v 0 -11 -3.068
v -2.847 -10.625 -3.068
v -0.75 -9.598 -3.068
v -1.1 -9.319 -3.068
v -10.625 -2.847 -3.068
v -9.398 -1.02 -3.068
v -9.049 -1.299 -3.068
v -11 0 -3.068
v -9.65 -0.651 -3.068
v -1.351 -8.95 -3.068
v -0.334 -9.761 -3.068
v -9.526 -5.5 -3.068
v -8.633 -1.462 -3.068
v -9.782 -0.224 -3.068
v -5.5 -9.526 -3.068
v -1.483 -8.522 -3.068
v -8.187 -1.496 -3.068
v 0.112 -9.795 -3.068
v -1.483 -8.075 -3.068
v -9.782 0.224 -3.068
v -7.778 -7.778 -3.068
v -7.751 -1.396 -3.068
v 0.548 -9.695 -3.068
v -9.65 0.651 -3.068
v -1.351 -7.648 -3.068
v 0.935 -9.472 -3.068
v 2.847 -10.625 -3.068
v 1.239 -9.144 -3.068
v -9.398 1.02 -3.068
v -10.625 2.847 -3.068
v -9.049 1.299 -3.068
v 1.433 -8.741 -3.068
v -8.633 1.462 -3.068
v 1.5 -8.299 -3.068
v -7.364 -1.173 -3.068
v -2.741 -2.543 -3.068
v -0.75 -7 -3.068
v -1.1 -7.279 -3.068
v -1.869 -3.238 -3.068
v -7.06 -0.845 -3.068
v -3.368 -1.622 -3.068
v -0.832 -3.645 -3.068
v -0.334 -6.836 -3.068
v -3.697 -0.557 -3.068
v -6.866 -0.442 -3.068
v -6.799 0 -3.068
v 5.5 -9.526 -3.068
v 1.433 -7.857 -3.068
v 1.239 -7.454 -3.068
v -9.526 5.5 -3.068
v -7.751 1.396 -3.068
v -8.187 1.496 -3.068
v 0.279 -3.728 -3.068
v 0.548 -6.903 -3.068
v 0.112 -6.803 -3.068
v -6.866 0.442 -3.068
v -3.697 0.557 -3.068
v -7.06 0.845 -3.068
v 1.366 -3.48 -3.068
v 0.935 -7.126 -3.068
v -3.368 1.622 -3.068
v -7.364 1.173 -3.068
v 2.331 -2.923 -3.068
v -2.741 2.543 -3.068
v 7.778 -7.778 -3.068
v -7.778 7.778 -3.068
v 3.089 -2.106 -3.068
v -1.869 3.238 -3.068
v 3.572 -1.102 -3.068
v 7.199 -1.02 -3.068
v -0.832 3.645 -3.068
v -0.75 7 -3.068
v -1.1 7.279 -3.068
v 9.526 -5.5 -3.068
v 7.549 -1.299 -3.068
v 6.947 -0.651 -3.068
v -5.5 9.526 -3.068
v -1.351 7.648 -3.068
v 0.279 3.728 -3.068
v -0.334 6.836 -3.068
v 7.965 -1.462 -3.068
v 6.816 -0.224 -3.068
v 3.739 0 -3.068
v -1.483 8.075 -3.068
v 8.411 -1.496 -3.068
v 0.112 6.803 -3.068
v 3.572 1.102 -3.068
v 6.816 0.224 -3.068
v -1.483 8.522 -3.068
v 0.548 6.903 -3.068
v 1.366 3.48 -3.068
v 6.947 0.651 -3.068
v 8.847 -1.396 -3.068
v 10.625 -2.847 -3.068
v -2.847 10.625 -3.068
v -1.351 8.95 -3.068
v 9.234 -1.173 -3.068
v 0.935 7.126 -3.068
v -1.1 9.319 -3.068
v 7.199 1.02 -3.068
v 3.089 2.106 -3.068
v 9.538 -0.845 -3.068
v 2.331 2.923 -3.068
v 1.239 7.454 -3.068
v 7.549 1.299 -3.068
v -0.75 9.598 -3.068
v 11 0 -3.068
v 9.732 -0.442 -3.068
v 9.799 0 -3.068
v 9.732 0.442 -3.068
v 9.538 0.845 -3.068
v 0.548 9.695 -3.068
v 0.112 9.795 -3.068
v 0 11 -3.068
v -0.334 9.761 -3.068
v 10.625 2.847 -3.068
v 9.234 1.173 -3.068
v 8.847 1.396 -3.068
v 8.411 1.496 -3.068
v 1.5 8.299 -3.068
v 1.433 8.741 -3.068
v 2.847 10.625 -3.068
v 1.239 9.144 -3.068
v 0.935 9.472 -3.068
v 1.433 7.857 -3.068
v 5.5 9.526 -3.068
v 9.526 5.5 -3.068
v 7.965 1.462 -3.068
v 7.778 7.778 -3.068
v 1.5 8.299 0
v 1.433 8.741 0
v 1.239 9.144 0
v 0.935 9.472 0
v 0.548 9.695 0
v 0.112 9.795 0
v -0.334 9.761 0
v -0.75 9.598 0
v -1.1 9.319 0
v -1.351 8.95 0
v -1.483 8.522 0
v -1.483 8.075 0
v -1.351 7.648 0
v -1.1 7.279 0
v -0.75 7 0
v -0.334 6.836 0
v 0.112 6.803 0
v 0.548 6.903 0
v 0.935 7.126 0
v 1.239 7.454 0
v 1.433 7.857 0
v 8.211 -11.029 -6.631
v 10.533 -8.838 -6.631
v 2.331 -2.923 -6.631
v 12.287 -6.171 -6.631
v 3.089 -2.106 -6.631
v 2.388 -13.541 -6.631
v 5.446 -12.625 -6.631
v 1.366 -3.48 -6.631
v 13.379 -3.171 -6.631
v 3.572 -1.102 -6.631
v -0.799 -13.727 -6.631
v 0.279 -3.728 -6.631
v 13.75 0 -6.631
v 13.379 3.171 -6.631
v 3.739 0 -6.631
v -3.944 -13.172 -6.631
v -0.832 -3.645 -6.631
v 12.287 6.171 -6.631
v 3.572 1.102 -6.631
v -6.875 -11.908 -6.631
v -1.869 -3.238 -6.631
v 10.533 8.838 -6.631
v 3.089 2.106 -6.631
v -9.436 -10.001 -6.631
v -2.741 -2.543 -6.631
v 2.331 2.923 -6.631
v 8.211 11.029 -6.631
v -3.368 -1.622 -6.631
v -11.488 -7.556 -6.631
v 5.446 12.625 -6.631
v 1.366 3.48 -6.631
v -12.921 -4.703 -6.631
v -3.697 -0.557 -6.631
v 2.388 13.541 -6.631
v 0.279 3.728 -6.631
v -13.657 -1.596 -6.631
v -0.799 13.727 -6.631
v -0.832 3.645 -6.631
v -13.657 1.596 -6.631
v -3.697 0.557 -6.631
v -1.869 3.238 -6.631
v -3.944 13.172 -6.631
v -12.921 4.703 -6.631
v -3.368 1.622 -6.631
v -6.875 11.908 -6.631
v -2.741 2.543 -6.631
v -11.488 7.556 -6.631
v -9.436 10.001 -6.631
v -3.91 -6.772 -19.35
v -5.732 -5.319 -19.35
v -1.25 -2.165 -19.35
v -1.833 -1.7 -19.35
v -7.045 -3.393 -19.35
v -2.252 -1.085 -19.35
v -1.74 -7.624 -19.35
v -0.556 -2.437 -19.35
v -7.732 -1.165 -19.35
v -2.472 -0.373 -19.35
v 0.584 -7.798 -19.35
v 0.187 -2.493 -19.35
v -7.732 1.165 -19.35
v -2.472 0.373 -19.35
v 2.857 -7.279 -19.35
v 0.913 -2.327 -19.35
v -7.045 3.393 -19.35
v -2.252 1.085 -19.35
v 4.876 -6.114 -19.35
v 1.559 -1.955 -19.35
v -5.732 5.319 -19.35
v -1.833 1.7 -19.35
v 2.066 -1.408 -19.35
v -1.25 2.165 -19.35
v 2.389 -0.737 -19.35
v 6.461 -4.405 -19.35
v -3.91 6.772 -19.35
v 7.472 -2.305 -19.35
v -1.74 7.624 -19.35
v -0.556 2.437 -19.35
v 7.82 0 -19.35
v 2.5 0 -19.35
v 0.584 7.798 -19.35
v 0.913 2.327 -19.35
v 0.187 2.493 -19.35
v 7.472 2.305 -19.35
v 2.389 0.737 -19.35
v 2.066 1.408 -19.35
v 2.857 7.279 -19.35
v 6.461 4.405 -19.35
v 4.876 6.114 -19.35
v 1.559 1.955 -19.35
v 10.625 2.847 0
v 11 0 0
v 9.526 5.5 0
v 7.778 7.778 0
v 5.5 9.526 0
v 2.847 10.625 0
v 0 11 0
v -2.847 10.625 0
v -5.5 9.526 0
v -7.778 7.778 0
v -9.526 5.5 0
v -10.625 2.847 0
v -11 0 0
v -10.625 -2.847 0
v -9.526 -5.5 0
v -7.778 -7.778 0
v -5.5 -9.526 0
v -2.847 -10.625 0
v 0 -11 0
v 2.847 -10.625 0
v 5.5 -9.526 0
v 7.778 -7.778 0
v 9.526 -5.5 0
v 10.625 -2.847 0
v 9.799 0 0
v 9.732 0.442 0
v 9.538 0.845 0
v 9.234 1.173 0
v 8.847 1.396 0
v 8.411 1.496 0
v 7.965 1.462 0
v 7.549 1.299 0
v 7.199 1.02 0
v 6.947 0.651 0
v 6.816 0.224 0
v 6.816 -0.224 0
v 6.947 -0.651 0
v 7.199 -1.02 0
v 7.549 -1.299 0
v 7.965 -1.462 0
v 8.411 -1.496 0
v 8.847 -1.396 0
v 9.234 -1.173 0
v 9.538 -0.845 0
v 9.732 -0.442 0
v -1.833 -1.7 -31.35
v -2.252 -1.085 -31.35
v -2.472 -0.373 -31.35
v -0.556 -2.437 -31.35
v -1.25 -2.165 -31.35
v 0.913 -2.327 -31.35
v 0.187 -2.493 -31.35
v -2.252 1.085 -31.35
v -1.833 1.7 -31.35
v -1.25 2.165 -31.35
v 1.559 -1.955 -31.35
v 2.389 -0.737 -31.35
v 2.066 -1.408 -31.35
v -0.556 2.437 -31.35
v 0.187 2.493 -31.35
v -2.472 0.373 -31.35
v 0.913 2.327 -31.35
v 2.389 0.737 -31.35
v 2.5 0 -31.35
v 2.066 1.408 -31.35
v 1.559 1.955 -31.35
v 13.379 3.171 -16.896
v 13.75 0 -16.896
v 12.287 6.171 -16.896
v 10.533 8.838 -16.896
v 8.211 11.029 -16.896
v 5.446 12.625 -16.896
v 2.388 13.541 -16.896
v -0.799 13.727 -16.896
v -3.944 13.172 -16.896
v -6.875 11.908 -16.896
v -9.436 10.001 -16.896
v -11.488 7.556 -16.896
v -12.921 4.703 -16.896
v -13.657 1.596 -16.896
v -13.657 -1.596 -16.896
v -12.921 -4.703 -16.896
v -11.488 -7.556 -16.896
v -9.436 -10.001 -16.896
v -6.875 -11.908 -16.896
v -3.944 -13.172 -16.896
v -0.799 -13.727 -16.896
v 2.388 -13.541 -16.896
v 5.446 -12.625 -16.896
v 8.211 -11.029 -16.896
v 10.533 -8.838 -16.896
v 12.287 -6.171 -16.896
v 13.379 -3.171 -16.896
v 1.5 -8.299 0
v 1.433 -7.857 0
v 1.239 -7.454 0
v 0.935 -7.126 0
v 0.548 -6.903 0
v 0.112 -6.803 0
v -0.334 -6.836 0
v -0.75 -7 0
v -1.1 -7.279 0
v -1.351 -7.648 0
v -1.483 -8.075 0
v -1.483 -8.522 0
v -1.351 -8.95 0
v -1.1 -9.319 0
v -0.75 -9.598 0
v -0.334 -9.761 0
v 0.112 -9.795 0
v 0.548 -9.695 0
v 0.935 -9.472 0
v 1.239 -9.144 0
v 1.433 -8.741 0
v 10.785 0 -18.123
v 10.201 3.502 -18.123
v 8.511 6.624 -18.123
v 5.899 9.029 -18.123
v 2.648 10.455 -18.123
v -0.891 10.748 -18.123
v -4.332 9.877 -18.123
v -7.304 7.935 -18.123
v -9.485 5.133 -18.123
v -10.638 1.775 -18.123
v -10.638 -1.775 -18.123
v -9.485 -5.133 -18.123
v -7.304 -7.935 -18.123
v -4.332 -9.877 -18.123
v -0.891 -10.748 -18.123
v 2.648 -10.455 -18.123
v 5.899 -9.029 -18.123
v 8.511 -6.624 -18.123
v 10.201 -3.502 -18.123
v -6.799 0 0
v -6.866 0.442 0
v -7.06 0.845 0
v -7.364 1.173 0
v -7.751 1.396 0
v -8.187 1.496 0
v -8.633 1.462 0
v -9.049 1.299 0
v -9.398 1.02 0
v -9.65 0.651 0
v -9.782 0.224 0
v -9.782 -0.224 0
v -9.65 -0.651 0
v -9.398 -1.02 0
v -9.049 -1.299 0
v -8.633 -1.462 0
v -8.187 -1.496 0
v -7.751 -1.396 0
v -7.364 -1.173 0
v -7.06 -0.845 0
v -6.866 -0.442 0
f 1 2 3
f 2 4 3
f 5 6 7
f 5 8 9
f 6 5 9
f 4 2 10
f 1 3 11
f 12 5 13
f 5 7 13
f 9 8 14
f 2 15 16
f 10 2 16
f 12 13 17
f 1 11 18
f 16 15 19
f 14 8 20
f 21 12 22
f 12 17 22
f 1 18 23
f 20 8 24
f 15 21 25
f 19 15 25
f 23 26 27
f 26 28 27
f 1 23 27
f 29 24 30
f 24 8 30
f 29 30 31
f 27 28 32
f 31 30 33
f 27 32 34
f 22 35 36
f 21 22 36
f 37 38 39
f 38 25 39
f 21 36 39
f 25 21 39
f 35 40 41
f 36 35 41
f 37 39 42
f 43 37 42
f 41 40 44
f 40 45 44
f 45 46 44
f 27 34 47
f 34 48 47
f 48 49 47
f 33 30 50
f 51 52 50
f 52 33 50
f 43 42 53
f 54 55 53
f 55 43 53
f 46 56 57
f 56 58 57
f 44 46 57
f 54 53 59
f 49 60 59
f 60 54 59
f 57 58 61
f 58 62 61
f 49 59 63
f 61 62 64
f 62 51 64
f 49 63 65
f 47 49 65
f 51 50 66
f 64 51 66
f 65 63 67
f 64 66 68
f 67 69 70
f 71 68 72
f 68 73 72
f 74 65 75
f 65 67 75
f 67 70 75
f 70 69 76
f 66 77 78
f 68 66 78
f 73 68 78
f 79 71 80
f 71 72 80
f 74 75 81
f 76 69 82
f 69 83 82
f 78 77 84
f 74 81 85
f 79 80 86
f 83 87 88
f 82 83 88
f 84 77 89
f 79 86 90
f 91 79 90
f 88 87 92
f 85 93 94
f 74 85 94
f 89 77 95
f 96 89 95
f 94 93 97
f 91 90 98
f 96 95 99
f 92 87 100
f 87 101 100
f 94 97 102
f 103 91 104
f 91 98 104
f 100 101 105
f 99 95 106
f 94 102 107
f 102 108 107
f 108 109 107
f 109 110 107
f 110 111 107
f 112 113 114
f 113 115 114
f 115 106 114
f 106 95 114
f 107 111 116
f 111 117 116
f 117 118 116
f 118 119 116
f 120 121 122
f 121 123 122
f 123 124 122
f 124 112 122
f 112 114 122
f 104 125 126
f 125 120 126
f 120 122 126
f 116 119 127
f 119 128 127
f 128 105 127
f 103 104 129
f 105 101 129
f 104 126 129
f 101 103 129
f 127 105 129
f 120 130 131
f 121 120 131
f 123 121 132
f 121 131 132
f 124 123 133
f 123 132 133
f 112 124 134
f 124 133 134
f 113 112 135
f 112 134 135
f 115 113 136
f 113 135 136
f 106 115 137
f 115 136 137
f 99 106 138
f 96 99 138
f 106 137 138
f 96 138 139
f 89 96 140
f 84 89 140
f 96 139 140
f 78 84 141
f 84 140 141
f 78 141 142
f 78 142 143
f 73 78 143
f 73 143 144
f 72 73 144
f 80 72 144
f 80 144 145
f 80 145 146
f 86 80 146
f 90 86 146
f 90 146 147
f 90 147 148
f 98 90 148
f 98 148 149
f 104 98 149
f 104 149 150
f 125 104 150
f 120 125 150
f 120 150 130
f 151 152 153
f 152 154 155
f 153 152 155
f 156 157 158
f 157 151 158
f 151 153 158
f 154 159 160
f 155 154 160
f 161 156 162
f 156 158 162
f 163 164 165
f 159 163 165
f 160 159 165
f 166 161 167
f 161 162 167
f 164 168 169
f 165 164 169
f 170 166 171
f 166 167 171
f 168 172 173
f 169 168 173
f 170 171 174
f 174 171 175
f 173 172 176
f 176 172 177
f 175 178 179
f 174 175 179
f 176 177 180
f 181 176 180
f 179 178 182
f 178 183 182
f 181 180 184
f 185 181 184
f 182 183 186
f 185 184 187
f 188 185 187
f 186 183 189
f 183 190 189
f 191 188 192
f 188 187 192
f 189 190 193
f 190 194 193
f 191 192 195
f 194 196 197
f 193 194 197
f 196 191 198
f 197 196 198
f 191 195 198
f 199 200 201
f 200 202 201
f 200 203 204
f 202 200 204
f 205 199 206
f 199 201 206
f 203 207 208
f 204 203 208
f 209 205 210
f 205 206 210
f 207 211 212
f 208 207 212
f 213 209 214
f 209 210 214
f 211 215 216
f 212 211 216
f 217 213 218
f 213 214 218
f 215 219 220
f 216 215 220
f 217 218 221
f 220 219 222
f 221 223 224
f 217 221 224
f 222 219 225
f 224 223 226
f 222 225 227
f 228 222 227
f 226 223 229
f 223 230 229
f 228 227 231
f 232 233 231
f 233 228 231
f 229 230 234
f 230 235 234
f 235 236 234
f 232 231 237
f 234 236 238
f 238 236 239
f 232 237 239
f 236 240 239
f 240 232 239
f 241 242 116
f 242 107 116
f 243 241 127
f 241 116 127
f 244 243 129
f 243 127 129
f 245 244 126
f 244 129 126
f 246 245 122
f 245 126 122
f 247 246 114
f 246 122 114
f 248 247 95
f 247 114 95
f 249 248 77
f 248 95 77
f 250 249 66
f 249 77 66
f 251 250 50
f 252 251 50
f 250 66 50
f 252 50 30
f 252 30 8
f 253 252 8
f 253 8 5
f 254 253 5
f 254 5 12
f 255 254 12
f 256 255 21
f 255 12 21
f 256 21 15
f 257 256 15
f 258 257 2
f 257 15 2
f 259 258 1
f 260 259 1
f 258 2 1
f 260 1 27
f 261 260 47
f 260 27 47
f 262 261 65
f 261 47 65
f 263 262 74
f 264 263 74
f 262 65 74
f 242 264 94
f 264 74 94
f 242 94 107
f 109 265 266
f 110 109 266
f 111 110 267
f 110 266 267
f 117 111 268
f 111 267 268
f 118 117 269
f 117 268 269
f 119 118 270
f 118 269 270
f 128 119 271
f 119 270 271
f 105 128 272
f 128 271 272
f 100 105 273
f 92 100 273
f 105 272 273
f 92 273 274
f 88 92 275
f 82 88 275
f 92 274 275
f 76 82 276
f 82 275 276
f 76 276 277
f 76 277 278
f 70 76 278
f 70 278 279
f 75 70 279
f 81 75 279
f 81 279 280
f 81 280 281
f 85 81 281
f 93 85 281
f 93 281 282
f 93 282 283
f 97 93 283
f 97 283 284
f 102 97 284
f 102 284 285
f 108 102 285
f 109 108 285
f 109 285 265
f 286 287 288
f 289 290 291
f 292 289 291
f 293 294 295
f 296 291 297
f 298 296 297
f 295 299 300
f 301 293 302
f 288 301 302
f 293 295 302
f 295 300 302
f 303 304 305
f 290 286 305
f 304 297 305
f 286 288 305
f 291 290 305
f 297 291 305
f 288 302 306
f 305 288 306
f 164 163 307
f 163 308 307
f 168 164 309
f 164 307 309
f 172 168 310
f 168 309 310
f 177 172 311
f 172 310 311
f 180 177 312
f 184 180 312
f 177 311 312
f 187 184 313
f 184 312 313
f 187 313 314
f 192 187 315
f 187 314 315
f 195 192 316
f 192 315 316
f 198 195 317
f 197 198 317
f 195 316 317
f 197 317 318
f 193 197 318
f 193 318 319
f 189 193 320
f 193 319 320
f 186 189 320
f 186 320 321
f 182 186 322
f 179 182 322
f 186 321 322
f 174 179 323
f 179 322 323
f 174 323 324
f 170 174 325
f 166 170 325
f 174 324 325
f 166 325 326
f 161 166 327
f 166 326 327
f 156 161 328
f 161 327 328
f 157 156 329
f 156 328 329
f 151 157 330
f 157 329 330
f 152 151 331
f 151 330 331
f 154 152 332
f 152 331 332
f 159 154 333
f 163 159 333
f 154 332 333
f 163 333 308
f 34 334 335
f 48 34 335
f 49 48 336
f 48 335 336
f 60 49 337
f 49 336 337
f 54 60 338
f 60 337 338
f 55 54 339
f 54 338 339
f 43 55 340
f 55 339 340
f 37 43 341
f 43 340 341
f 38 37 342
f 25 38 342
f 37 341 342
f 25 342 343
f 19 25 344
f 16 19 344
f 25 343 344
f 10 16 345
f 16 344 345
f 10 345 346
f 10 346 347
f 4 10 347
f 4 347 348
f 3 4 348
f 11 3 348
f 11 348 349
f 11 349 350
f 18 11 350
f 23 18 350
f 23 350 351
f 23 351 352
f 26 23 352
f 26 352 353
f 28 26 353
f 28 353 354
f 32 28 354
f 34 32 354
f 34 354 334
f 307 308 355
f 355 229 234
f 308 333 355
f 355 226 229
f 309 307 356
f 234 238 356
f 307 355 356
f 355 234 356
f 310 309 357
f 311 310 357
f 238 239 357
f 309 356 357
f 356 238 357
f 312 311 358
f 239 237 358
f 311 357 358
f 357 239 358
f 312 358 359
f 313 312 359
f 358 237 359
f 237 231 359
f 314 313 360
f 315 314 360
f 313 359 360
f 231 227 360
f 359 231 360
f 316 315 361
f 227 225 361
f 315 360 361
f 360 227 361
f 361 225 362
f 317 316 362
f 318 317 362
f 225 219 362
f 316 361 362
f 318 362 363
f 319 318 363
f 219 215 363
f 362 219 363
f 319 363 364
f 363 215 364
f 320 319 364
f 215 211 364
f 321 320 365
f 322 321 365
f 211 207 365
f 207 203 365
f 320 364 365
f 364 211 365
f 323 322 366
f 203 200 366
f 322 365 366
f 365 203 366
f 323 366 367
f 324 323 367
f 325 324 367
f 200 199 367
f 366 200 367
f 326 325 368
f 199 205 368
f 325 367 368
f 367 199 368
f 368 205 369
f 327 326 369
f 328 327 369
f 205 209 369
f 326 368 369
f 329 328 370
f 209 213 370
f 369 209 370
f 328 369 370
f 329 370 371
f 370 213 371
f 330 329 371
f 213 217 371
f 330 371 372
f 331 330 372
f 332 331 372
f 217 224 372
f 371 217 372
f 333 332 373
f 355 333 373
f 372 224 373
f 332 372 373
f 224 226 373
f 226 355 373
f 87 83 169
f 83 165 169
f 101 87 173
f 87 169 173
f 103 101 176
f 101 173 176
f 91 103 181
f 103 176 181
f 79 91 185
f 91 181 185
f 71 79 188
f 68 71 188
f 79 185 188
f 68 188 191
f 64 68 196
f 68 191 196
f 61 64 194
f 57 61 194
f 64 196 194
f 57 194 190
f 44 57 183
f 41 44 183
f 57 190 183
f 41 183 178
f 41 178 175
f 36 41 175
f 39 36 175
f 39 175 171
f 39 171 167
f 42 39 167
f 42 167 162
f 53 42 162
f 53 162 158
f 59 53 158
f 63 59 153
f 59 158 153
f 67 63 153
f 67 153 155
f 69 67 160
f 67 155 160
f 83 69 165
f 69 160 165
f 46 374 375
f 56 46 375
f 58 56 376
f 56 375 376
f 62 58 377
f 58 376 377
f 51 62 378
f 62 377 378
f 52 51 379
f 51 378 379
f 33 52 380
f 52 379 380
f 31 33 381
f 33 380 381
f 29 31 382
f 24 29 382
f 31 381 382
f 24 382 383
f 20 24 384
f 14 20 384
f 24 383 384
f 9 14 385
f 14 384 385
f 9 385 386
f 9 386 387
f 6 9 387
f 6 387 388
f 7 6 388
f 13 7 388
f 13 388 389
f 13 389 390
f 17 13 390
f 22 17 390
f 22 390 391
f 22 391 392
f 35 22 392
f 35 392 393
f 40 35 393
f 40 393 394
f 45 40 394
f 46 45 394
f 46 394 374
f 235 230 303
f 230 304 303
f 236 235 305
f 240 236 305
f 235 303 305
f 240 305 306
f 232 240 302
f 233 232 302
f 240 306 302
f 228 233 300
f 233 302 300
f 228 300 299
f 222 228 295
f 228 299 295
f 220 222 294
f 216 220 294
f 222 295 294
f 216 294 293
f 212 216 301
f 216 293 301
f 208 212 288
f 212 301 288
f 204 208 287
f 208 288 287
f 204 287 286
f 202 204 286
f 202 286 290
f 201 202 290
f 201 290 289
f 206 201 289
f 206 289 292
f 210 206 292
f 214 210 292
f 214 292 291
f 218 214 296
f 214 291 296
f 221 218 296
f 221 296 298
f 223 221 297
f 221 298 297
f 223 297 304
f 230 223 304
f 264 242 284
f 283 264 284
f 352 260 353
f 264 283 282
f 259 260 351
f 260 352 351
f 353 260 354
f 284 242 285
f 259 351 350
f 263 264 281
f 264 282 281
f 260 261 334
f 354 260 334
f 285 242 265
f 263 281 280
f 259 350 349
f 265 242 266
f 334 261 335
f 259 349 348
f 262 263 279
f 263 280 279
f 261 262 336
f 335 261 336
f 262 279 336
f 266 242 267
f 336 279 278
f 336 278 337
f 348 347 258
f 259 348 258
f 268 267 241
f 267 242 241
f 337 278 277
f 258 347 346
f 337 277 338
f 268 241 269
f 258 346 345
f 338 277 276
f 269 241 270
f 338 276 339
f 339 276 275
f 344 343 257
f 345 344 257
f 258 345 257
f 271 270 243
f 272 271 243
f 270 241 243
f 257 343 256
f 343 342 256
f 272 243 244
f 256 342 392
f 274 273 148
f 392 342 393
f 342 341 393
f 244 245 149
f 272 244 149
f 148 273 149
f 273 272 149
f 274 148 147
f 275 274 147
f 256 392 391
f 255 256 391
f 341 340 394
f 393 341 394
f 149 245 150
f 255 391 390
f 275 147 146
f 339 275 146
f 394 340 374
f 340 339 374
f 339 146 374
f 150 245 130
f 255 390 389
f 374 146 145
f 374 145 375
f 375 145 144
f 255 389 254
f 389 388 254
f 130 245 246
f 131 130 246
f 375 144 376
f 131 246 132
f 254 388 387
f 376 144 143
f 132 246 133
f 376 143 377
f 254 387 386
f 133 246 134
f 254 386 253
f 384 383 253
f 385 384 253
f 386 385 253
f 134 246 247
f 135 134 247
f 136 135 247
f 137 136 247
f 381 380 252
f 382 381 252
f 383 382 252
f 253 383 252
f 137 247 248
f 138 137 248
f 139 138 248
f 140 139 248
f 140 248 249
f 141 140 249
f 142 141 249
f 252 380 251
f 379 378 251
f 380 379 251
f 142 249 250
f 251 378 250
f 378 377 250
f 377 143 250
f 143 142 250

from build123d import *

# Parameters (mm, degrees)
SKETCH2_R          = 1.5
CUT_EXTRUDE1_DEPTH = 5


with BuildPart() as part:
    # Sketch1 → Revolve1 (revolve)
    with BuildSketch(Plane(origin=(0, 0, 0), x_dir=(1, 0, 0), z_dir=(0, 1, 0))):
        Polygon((0, 0), (11, 0), (11, 3.06822983), (3.73856208, 3.06822983), (3.73856208, 6.631290685), (13.75, 6.631290685), (13.75, 16.896299341), (7.819804578, 19.35), (2.5, 19.35), (2.5, 31.35), (0, 31.35), align=None)
    revolve(axis=Axis((0, 0, -31.35), (0, 0, 1)))

    # Sketch2 → Cut-Extrude1 (cut)
    with BuildSketch(Plane.XY):
        with Locations((8.298889382, 0)):
            Circle(SKETCH2_R)
        with Locations((0, -8.298889382)):
            Circle(SKETCH2_R)
        with Locations((-8.298889382, 0)):
            Circle(SKETCH2_R)
        with Locations((0, 8.298889382)):
            Circle(SKETCH2_R)
    extrude(amount=-CUT_EXTRUDE1_DEPTH, mode=Mode.SUBTRACT)


solid = part.part
